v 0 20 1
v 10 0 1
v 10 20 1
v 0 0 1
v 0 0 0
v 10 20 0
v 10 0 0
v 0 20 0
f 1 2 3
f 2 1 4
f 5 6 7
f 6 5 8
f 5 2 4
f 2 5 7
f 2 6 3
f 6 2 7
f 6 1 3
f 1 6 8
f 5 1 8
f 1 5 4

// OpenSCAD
// compat-args: -D overridden=42 -D kept_header=7
overridden = 10; // [0:100]
untouched = 20; // [0:50]
module m() {
    cube([overridden, untouched, 1]);
}
m();
